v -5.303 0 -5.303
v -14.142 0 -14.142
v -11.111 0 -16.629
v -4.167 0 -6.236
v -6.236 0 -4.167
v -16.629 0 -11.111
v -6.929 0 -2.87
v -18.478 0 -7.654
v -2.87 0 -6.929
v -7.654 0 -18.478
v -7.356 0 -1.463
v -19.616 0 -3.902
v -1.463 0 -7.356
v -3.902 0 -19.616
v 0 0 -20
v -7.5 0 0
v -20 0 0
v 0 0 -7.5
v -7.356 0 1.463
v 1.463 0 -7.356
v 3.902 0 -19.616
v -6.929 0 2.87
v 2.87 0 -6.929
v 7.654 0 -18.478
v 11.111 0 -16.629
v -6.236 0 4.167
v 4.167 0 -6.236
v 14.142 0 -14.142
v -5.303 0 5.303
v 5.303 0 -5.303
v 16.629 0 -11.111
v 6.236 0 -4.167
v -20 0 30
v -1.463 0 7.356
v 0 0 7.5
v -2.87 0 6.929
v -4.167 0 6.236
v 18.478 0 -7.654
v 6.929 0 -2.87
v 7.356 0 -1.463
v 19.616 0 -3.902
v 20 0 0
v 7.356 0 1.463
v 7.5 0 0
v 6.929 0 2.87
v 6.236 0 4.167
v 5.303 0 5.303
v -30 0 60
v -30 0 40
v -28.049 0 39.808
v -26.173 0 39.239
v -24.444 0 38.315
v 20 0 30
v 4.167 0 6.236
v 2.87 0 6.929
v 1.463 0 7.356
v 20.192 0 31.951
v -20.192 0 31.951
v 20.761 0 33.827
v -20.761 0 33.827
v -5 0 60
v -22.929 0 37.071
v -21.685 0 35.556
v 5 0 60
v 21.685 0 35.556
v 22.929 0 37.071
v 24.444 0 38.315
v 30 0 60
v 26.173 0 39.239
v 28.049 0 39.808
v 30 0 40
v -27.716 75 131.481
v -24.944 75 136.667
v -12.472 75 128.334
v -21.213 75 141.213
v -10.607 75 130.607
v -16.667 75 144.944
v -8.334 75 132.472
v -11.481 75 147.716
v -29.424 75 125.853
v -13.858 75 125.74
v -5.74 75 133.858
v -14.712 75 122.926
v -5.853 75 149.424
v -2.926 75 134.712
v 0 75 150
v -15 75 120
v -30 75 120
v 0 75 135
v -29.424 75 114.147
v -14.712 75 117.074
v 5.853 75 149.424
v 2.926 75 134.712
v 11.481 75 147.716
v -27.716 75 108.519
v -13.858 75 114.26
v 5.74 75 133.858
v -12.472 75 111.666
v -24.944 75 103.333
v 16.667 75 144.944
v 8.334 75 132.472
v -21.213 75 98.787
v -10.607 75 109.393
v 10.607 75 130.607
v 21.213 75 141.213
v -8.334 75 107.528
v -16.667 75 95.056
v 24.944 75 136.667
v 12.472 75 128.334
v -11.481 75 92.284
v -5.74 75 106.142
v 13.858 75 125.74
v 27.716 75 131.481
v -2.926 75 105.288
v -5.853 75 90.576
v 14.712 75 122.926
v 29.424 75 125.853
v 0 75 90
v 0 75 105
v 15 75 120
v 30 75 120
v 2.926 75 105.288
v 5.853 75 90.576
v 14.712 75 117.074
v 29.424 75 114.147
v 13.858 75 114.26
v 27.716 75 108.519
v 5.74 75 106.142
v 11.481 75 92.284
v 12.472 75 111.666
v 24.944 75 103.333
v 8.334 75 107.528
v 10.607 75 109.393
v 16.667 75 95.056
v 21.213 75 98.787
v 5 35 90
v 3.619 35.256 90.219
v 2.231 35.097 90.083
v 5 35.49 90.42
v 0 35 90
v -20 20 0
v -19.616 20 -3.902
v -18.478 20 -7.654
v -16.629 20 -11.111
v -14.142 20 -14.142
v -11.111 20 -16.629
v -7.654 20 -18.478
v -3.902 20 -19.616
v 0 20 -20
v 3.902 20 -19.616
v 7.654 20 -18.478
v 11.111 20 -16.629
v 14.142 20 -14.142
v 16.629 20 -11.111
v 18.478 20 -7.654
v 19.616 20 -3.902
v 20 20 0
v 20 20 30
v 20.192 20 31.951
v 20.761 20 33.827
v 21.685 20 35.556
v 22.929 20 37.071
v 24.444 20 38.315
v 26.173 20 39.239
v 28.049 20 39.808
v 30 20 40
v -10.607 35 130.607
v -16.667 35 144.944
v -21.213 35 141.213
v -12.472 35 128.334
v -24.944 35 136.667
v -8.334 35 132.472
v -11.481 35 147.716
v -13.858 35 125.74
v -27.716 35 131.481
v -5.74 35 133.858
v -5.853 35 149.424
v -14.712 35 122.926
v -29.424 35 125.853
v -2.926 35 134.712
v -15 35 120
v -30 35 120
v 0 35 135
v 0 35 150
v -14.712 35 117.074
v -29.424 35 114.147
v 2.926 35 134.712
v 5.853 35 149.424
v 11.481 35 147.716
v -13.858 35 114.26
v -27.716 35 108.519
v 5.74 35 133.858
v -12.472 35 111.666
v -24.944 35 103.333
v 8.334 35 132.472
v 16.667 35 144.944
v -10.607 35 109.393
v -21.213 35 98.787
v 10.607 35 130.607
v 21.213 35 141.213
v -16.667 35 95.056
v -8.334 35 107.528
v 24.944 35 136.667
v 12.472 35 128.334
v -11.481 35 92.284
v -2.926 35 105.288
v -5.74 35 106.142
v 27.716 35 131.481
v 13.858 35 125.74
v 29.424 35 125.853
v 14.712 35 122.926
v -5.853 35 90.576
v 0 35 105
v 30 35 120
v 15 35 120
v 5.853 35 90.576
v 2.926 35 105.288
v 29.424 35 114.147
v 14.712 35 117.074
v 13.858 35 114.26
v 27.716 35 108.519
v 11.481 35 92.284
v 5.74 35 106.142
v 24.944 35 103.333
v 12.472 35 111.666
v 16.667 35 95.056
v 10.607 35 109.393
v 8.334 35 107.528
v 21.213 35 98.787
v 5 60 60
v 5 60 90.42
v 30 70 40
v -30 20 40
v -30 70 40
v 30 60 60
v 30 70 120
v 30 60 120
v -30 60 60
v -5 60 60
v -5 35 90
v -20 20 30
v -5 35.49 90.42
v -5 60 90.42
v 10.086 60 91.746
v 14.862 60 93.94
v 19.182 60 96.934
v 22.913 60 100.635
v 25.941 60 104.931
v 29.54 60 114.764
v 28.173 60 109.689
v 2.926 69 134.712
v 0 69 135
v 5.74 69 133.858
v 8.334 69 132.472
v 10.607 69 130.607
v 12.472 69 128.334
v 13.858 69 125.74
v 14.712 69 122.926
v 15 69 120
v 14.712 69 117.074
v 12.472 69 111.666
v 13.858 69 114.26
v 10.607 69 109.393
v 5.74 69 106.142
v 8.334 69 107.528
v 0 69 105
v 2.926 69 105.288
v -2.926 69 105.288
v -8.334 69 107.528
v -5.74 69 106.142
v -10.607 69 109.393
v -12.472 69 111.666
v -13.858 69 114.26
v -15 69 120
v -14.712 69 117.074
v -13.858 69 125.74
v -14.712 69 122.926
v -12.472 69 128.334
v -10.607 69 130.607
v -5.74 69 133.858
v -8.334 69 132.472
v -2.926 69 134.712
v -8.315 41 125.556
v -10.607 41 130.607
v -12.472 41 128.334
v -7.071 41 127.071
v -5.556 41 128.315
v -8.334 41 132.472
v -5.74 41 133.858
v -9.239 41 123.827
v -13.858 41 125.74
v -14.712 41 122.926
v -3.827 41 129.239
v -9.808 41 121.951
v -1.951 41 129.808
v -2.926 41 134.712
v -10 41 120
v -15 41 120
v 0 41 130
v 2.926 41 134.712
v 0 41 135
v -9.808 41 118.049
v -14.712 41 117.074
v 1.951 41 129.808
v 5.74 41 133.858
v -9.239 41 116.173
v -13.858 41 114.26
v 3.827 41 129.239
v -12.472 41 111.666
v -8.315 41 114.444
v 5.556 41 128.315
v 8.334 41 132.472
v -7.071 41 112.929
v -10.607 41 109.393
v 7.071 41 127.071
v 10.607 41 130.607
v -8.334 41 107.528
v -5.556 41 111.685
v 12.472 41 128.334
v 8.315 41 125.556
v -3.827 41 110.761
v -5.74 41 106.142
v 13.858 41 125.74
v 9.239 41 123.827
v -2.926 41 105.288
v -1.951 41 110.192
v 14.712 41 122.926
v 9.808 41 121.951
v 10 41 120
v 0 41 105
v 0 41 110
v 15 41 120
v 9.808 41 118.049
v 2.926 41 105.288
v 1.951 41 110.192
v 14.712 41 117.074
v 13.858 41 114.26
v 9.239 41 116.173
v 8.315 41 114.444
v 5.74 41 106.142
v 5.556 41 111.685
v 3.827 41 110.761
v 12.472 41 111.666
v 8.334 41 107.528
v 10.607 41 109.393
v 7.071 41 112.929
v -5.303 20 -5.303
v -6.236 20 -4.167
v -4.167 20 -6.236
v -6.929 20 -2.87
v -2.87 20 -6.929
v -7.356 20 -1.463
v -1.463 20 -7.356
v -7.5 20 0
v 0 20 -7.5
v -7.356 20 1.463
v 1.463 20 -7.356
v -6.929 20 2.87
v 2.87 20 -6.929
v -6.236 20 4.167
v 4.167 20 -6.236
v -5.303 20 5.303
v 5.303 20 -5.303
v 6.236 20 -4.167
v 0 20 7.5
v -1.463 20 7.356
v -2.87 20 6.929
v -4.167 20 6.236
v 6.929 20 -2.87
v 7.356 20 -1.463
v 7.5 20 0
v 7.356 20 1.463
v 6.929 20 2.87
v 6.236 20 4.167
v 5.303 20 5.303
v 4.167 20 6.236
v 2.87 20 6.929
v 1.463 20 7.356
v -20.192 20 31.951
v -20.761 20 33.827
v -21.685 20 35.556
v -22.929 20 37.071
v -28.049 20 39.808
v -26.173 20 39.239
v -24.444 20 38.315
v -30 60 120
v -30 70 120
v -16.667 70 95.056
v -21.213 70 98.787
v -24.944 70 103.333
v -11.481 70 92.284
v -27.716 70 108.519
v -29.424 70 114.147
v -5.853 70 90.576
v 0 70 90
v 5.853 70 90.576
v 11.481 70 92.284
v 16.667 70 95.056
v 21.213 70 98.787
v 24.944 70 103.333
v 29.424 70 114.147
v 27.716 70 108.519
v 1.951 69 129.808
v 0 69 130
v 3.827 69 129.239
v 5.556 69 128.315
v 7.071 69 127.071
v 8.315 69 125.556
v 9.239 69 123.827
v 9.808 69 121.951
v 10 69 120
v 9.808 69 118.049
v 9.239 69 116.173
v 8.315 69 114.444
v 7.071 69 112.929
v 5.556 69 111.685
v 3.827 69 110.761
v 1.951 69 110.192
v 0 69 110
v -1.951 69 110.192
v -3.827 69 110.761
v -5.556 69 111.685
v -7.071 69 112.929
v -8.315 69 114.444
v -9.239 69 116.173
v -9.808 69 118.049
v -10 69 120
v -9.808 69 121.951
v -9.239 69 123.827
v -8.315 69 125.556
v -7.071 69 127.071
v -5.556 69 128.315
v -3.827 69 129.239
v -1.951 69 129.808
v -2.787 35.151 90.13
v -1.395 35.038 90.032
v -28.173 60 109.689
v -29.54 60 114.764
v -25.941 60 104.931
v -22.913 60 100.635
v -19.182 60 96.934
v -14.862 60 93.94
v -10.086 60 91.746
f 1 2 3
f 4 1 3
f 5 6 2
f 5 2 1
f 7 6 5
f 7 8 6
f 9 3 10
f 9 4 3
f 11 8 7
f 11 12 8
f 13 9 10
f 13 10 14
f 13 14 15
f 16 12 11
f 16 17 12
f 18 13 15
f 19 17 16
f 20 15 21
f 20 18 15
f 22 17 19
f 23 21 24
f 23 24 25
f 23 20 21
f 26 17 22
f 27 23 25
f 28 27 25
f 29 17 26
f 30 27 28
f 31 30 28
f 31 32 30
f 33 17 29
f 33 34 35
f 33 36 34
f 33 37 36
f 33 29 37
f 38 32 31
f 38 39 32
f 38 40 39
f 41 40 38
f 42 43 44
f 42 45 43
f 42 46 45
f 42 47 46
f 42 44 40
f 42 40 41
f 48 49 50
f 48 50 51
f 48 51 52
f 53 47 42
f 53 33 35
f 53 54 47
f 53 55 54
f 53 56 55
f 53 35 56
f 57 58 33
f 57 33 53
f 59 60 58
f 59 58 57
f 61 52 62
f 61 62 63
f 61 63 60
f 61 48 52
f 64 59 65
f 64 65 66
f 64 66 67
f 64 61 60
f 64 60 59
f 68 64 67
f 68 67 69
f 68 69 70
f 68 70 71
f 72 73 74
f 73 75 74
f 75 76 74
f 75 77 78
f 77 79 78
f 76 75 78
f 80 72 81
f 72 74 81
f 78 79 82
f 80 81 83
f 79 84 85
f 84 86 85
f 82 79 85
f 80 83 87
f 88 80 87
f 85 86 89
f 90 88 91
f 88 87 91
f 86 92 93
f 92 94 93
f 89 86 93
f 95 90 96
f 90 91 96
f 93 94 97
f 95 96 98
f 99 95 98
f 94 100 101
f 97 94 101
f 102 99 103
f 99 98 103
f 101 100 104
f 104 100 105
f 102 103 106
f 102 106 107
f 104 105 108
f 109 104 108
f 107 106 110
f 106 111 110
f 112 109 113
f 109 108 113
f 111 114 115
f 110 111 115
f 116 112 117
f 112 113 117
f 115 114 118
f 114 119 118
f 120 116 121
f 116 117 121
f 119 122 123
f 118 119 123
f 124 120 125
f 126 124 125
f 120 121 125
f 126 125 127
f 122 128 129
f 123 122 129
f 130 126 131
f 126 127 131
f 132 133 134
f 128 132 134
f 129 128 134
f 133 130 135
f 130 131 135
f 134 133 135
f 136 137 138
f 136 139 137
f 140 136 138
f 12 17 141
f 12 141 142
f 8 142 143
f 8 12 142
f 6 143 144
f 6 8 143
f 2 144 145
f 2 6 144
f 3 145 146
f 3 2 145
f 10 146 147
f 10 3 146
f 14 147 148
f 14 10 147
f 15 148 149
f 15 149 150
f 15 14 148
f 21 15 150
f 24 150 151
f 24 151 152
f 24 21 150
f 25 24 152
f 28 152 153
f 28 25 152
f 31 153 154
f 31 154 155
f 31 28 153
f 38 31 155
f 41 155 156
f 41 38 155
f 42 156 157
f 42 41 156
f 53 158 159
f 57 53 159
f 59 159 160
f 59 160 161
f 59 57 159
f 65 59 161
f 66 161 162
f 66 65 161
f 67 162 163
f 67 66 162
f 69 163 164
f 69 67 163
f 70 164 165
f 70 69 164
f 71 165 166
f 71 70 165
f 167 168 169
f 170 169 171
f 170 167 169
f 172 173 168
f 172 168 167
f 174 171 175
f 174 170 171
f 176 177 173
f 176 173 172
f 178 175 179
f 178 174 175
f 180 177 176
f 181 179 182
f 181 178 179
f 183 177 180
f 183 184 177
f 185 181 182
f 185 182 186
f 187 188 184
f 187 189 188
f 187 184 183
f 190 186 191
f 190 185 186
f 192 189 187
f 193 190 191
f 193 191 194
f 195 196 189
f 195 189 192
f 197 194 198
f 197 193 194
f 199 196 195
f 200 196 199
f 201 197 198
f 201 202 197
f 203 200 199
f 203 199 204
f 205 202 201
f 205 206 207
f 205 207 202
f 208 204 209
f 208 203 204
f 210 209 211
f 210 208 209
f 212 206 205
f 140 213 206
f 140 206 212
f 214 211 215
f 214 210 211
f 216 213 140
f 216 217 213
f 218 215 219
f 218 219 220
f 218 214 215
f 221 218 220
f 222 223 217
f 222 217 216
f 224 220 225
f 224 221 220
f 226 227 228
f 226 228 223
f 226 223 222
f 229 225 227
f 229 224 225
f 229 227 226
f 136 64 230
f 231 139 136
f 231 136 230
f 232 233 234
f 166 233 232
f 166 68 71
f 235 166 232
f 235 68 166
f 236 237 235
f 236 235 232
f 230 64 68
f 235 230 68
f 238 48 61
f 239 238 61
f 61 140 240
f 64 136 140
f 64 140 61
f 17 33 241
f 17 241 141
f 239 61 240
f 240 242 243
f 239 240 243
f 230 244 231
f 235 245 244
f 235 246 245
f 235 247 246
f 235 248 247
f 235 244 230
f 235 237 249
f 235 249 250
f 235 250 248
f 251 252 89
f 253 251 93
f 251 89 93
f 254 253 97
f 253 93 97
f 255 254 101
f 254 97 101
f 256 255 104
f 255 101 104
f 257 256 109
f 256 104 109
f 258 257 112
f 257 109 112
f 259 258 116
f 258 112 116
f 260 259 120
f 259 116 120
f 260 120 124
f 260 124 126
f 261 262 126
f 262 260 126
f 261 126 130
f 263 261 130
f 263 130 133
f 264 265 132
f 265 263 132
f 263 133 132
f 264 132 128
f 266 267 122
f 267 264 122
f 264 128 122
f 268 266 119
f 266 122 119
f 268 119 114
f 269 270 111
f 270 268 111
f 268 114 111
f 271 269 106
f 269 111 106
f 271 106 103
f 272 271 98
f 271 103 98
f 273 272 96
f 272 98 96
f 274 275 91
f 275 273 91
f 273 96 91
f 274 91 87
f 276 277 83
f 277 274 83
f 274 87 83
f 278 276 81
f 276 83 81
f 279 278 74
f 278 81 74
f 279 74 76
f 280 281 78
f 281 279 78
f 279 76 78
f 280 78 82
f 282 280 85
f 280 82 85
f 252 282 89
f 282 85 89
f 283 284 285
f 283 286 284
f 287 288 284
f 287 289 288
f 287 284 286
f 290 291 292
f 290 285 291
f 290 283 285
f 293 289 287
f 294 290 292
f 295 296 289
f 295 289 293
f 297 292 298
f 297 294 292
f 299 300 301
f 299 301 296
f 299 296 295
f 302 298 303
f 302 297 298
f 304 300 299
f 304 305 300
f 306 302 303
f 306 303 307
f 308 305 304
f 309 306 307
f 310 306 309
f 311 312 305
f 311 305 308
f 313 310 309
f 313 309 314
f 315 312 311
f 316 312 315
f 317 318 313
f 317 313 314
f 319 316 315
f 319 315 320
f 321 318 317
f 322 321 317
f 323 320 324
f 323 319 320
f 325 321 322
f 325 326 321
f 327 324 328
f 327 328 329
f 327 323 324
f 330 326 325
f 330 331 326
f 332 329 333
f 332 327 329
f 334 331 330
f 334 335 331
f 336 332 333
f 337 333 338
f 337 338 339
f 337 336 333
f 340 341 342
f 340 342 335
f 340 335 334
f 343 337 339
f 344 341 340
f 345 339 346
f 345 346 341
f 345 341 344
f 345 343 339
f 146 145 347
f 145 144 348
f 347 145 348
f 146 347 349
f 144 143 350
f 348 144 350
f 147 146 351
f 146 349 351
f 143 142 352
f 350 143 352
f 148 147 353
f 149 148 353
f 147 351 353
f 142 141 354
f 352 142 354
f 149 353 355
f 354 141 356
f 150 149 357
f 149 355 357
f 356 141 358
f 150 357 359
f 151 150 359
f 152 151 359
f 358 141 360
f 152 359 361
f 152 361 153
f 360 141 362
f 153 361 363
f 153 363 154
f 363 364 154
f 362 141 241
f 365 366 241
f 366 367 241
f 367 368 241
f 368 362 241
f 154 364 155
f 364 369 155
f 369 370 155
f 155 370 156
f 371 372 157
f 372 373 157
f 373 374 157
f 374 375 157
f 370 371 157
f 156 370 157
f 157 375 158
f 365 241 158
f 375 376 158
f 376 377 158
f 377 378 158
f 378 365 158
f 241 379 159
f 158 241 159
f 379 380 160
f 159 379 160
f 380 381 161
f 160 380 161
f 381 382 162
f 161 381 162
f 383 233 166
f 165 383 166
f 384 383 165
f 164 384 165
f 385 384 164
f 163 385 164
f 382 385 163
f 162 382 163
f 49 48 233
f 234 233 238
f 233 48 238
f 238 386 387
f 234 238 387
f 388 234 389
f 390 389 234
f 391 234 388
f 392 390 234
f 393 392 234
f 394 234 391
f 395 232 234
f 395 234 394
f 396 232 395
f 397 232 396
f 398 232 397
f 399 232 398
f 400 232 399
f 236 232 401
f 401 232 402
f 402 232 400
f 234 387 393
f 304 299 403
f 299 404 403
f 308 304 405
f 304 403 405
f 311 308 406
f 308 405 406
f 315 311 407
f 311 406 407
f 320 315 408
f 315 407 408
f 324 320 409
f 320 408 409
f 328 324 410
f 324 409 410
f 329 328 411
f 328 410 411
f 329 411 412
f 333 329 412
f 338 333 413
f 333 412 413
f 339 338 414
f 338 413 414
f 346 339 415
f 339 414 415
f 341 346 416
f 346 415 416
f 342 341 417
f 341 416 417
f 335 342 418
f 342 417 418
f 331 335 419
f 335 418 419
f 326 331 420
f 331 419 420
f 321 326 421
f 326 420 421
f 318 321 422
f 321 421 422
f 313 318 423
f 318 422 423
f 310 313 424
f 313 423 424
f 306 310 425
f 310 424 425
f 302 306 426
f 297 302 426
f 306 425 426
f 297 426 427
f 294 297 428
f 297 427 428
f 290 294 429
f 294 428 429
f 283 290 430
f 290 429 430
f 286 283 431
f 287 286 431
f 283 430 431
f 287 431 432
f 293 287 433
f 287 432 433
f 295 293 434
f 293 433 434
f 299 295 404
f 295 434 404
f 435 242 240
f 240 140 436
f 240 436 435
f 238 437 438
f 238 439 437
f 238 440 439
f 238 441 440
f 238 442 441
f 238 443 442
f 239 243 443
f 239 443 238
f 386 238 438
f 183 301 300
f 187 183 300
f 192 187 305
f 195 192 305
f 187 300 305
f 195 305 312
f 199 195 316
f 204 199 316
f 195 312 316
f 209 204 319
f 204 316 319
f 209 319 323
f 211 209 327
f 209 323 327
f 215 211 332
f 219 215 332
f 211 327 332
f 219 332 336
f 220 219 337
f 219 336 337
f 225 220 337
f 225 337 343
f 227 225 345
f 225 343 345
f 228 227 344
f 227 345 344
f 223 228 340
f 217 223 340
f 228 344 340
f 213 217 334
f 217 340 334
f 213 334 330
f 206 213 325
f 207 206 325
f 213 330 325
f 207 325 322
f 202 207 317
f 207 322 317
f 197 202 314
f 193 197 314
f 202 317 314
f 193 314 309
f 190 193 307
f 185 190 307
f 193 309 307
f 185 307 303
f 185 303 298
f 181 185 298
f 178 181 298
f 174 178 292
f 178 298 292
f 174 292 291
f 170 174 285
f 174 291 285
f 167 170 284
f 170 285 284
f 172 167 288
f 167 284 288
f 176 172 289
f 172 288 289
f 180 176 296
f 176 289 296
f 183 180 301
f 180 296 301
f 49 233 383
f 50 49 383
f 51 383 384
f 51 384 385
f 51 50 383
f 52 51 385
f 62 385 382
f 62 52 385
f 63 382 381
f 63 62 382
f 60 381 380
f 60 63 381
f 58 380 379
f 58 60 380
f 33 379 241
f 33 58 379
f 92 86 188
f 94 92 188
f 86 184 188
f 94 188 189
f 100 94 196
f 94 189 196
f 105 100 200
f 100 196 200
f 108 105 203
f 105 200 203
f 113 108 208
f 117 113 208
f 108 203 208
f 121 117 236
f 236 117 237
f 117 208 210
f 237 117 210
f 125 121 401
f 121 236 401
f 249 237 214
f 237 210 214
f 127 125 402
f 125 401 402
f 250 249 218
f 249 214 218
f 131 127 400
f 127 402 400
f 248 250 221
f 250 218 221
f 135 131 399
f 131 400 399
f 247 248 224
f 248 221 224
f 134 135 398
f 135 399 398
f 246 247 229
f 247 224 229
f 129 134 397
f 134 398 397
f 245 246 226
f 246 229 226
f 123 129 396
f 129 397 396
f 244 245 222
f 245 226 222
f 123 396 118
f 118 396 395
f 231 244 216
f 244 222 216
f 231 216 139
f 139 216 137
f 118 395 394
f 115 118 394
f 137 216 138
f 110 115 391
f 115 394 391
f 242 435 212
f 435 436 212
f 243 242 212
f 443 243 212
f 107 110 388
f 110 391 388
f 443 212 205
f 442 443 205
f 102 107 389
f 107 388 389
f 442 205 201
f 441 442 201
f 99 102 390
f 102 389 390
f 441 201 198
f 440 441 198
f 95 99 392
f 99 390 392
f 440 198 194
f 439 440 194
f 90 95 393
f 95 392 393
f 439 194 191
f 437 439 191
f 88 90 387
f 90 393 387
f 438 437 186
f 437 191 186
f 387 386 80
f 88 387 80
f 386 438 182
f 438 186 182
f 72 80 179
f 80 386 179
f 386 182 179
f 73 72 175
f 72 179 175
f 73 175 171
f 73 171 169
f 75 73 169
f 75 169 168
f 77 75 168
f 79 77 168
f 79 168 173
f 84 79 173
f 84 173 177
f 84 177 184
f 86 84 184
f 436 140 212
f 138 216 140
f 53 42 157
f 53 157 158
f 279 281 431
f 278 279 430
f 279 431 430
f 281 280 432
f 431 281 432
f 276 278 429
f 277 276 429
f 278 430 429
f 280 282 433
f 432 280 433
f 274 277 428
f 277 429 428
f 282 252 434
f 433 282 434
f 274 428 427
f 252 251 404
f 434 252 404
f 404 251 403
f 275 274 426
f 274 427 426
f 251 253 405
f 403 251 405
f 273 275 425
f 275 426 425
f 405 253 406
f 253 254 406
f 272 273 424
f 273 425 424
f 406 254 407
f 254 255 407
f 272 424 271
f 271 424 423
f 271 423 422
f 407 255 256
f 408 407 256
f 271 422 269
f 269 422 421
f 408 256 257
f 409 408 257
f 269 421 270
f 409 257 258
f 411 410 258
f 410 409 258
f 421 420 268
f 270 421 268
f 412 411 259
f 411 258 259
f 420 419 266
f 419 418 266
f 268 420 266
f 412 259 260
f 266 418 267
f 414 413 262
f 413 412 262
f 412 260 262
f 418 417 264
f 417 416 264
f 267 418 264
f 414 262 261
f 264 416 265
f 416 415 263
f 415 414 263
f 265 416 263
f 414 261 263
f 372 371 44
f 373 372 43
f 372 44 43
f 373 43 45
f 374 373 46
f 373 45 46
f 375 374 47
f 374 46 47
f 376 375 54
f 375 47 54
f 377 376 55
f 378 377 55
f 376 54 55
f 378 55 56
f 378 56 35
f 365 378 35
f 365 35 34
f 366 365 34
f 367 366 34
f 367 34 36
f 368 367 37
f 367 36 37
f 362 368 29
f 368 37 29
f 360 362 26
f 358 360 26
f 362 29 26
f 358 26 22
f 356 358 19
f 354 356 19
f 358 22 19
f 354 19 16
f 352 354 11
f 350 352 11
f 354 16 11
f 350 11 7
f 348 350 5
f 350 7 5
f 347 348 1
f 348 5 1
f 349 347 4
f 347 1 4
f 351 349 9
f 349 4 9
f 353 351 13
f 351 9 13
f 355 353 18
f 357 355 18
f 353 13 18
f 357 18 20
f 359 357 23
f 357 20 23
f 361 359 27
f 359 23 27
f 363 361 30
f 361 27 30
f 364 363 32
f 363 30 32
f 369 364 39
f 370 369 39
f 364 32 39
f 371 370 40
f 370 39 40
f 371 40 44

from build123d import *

# Parameters (mm, degrees)
F0_R     = 7.5
F0_W     = 60
F0_H     = 20
F1_DEPTH = 20
F2_DEPTH = 70
F3_W     = 28
F3_H     = 5
F3_W_2   = 6
F3_H_2   = 15
F3_W_3   = 1
F3_W_4   = 9
F3_H_3   = 10
F5_DEPTH = 30
F6_DEPTH = 5


with BuildPart() as f1:
    # F0 (on Front) → F1 (new body)
    with BuildSketch(Plane.XZ):
        with BuildLine():
            Line((-20, 30), (-20, 0))
            ThreePointArc((-20, 0), (0, -20), (20, 0))
            Line((20, 0), (20, 30))
            ThreePointArc((20, 30), (22.9289321881, 37.0710678119), (30, 40))
            Line((30, 40), (-30, 40))
            ThreePointArc((-30, 40), (-22.9289321881, 37.0710678119), (-20, 30))
        make_face()
        Circle(F0_R, mode=Mode.SUBTRACT)
        with Locations((0, 50)):
            Rectangle(F0_W, F0_H)
    extrude(amount=-F1_DEPTH)

    # F0 (on Front) → F2 (join)
    with BuildSketch(Plane.XZ):
        with Locations((0, 50)):
            Rectangle(F0_W, F0_H)
    extrude(amount=-F2_DEPTH)



with BuildPart() as f4:
    # F3 (on Right) → F4 (revolve)
    with BuildSketch(Plane.YZ):
        with Locations((55, 132.5)):
            Rectangle(F3_W, F3_H)
        with Locations((38, 142.5)):
            Rectangle(F3_W_2, F3_H_2)
        with Locations((72, 142.5)):
            Rectangle(F3_W_2, F3_H_2)
        with Locations((55, 142.5)):
            Rectangle(F3_W, F3_H_2)
    revolve(axis=Axis((0, 55, 120), (0, 1, 0)))


with BuildPart() as f1_1:
    add(f1.part)

    add(f4.part)  # F5 merges F4
    # F3 (on Right) → F5 (join, symmetric)
    with BuildSketch(Plane.YZ):
        Polygon((60, 90), (60, 60), (70, 60), (70, 90), (69, 90), align=None)
        with Locations((69.5, 97.5)):
            Rectangle(F3_W_3, F3_H_2)
        with Locations((64.5, 107.5)):
            Rectangle(F3_W_4, F3_H)
        with Locations((64.5, 115)):
            Rectangle(F3_W_4, F3_H_3)
        with Locations((64.5, 97.5)):
            Rectangle(F3_W_4, F3_H_2)
        with Locations((69.5, 115)):
            Rectangle(F3_W_3, F3_H_3)
        with Locations((69.5, 107.5)):
            Rectangle(F3_W_3, F3_H)
    extrude(amount=F5_DEPTH, both=True)

    # F3 (on Right) → F6 (join, symmetric)
    with BuildSketch(Plane.YZ):
        Polygon((35, 90), (0, 60), (60, 60), (60, 90), (41, 90), align=None)
        Polygon((41, 95.1428036188), (35, 90), (41, 90), align=None)
        Polygon((41, 90), (60, 90), (60, 105), (52.5001821322, 105), (41, 95.1428036188), align=None)
    extrude(amount=F6_DEPTH, both=True)

    # F3 (on Right) → F7 (revolve, cut)
    with BuildSketch(Plane.YZ):
        Polygon((35, 135), (35, 120), (41, 120), (41, 130), (41, 135), align=None)
        Polygon((41, 130), (41, 120), (60, 120), (69, 120), (69, 130), align=None)
        Polygon((69, 120), (70, 120), (75, 120), (75, 130), (69, 130), align=None)
        with Locations((72, 132.5)):
            Rectangle(F3_W_2, F3_H)
    revolve(axis=Axis((0, 55, 120), (0, 1, 0)), mode=Mode.SUBTRACT)


solid = f1_1.part
